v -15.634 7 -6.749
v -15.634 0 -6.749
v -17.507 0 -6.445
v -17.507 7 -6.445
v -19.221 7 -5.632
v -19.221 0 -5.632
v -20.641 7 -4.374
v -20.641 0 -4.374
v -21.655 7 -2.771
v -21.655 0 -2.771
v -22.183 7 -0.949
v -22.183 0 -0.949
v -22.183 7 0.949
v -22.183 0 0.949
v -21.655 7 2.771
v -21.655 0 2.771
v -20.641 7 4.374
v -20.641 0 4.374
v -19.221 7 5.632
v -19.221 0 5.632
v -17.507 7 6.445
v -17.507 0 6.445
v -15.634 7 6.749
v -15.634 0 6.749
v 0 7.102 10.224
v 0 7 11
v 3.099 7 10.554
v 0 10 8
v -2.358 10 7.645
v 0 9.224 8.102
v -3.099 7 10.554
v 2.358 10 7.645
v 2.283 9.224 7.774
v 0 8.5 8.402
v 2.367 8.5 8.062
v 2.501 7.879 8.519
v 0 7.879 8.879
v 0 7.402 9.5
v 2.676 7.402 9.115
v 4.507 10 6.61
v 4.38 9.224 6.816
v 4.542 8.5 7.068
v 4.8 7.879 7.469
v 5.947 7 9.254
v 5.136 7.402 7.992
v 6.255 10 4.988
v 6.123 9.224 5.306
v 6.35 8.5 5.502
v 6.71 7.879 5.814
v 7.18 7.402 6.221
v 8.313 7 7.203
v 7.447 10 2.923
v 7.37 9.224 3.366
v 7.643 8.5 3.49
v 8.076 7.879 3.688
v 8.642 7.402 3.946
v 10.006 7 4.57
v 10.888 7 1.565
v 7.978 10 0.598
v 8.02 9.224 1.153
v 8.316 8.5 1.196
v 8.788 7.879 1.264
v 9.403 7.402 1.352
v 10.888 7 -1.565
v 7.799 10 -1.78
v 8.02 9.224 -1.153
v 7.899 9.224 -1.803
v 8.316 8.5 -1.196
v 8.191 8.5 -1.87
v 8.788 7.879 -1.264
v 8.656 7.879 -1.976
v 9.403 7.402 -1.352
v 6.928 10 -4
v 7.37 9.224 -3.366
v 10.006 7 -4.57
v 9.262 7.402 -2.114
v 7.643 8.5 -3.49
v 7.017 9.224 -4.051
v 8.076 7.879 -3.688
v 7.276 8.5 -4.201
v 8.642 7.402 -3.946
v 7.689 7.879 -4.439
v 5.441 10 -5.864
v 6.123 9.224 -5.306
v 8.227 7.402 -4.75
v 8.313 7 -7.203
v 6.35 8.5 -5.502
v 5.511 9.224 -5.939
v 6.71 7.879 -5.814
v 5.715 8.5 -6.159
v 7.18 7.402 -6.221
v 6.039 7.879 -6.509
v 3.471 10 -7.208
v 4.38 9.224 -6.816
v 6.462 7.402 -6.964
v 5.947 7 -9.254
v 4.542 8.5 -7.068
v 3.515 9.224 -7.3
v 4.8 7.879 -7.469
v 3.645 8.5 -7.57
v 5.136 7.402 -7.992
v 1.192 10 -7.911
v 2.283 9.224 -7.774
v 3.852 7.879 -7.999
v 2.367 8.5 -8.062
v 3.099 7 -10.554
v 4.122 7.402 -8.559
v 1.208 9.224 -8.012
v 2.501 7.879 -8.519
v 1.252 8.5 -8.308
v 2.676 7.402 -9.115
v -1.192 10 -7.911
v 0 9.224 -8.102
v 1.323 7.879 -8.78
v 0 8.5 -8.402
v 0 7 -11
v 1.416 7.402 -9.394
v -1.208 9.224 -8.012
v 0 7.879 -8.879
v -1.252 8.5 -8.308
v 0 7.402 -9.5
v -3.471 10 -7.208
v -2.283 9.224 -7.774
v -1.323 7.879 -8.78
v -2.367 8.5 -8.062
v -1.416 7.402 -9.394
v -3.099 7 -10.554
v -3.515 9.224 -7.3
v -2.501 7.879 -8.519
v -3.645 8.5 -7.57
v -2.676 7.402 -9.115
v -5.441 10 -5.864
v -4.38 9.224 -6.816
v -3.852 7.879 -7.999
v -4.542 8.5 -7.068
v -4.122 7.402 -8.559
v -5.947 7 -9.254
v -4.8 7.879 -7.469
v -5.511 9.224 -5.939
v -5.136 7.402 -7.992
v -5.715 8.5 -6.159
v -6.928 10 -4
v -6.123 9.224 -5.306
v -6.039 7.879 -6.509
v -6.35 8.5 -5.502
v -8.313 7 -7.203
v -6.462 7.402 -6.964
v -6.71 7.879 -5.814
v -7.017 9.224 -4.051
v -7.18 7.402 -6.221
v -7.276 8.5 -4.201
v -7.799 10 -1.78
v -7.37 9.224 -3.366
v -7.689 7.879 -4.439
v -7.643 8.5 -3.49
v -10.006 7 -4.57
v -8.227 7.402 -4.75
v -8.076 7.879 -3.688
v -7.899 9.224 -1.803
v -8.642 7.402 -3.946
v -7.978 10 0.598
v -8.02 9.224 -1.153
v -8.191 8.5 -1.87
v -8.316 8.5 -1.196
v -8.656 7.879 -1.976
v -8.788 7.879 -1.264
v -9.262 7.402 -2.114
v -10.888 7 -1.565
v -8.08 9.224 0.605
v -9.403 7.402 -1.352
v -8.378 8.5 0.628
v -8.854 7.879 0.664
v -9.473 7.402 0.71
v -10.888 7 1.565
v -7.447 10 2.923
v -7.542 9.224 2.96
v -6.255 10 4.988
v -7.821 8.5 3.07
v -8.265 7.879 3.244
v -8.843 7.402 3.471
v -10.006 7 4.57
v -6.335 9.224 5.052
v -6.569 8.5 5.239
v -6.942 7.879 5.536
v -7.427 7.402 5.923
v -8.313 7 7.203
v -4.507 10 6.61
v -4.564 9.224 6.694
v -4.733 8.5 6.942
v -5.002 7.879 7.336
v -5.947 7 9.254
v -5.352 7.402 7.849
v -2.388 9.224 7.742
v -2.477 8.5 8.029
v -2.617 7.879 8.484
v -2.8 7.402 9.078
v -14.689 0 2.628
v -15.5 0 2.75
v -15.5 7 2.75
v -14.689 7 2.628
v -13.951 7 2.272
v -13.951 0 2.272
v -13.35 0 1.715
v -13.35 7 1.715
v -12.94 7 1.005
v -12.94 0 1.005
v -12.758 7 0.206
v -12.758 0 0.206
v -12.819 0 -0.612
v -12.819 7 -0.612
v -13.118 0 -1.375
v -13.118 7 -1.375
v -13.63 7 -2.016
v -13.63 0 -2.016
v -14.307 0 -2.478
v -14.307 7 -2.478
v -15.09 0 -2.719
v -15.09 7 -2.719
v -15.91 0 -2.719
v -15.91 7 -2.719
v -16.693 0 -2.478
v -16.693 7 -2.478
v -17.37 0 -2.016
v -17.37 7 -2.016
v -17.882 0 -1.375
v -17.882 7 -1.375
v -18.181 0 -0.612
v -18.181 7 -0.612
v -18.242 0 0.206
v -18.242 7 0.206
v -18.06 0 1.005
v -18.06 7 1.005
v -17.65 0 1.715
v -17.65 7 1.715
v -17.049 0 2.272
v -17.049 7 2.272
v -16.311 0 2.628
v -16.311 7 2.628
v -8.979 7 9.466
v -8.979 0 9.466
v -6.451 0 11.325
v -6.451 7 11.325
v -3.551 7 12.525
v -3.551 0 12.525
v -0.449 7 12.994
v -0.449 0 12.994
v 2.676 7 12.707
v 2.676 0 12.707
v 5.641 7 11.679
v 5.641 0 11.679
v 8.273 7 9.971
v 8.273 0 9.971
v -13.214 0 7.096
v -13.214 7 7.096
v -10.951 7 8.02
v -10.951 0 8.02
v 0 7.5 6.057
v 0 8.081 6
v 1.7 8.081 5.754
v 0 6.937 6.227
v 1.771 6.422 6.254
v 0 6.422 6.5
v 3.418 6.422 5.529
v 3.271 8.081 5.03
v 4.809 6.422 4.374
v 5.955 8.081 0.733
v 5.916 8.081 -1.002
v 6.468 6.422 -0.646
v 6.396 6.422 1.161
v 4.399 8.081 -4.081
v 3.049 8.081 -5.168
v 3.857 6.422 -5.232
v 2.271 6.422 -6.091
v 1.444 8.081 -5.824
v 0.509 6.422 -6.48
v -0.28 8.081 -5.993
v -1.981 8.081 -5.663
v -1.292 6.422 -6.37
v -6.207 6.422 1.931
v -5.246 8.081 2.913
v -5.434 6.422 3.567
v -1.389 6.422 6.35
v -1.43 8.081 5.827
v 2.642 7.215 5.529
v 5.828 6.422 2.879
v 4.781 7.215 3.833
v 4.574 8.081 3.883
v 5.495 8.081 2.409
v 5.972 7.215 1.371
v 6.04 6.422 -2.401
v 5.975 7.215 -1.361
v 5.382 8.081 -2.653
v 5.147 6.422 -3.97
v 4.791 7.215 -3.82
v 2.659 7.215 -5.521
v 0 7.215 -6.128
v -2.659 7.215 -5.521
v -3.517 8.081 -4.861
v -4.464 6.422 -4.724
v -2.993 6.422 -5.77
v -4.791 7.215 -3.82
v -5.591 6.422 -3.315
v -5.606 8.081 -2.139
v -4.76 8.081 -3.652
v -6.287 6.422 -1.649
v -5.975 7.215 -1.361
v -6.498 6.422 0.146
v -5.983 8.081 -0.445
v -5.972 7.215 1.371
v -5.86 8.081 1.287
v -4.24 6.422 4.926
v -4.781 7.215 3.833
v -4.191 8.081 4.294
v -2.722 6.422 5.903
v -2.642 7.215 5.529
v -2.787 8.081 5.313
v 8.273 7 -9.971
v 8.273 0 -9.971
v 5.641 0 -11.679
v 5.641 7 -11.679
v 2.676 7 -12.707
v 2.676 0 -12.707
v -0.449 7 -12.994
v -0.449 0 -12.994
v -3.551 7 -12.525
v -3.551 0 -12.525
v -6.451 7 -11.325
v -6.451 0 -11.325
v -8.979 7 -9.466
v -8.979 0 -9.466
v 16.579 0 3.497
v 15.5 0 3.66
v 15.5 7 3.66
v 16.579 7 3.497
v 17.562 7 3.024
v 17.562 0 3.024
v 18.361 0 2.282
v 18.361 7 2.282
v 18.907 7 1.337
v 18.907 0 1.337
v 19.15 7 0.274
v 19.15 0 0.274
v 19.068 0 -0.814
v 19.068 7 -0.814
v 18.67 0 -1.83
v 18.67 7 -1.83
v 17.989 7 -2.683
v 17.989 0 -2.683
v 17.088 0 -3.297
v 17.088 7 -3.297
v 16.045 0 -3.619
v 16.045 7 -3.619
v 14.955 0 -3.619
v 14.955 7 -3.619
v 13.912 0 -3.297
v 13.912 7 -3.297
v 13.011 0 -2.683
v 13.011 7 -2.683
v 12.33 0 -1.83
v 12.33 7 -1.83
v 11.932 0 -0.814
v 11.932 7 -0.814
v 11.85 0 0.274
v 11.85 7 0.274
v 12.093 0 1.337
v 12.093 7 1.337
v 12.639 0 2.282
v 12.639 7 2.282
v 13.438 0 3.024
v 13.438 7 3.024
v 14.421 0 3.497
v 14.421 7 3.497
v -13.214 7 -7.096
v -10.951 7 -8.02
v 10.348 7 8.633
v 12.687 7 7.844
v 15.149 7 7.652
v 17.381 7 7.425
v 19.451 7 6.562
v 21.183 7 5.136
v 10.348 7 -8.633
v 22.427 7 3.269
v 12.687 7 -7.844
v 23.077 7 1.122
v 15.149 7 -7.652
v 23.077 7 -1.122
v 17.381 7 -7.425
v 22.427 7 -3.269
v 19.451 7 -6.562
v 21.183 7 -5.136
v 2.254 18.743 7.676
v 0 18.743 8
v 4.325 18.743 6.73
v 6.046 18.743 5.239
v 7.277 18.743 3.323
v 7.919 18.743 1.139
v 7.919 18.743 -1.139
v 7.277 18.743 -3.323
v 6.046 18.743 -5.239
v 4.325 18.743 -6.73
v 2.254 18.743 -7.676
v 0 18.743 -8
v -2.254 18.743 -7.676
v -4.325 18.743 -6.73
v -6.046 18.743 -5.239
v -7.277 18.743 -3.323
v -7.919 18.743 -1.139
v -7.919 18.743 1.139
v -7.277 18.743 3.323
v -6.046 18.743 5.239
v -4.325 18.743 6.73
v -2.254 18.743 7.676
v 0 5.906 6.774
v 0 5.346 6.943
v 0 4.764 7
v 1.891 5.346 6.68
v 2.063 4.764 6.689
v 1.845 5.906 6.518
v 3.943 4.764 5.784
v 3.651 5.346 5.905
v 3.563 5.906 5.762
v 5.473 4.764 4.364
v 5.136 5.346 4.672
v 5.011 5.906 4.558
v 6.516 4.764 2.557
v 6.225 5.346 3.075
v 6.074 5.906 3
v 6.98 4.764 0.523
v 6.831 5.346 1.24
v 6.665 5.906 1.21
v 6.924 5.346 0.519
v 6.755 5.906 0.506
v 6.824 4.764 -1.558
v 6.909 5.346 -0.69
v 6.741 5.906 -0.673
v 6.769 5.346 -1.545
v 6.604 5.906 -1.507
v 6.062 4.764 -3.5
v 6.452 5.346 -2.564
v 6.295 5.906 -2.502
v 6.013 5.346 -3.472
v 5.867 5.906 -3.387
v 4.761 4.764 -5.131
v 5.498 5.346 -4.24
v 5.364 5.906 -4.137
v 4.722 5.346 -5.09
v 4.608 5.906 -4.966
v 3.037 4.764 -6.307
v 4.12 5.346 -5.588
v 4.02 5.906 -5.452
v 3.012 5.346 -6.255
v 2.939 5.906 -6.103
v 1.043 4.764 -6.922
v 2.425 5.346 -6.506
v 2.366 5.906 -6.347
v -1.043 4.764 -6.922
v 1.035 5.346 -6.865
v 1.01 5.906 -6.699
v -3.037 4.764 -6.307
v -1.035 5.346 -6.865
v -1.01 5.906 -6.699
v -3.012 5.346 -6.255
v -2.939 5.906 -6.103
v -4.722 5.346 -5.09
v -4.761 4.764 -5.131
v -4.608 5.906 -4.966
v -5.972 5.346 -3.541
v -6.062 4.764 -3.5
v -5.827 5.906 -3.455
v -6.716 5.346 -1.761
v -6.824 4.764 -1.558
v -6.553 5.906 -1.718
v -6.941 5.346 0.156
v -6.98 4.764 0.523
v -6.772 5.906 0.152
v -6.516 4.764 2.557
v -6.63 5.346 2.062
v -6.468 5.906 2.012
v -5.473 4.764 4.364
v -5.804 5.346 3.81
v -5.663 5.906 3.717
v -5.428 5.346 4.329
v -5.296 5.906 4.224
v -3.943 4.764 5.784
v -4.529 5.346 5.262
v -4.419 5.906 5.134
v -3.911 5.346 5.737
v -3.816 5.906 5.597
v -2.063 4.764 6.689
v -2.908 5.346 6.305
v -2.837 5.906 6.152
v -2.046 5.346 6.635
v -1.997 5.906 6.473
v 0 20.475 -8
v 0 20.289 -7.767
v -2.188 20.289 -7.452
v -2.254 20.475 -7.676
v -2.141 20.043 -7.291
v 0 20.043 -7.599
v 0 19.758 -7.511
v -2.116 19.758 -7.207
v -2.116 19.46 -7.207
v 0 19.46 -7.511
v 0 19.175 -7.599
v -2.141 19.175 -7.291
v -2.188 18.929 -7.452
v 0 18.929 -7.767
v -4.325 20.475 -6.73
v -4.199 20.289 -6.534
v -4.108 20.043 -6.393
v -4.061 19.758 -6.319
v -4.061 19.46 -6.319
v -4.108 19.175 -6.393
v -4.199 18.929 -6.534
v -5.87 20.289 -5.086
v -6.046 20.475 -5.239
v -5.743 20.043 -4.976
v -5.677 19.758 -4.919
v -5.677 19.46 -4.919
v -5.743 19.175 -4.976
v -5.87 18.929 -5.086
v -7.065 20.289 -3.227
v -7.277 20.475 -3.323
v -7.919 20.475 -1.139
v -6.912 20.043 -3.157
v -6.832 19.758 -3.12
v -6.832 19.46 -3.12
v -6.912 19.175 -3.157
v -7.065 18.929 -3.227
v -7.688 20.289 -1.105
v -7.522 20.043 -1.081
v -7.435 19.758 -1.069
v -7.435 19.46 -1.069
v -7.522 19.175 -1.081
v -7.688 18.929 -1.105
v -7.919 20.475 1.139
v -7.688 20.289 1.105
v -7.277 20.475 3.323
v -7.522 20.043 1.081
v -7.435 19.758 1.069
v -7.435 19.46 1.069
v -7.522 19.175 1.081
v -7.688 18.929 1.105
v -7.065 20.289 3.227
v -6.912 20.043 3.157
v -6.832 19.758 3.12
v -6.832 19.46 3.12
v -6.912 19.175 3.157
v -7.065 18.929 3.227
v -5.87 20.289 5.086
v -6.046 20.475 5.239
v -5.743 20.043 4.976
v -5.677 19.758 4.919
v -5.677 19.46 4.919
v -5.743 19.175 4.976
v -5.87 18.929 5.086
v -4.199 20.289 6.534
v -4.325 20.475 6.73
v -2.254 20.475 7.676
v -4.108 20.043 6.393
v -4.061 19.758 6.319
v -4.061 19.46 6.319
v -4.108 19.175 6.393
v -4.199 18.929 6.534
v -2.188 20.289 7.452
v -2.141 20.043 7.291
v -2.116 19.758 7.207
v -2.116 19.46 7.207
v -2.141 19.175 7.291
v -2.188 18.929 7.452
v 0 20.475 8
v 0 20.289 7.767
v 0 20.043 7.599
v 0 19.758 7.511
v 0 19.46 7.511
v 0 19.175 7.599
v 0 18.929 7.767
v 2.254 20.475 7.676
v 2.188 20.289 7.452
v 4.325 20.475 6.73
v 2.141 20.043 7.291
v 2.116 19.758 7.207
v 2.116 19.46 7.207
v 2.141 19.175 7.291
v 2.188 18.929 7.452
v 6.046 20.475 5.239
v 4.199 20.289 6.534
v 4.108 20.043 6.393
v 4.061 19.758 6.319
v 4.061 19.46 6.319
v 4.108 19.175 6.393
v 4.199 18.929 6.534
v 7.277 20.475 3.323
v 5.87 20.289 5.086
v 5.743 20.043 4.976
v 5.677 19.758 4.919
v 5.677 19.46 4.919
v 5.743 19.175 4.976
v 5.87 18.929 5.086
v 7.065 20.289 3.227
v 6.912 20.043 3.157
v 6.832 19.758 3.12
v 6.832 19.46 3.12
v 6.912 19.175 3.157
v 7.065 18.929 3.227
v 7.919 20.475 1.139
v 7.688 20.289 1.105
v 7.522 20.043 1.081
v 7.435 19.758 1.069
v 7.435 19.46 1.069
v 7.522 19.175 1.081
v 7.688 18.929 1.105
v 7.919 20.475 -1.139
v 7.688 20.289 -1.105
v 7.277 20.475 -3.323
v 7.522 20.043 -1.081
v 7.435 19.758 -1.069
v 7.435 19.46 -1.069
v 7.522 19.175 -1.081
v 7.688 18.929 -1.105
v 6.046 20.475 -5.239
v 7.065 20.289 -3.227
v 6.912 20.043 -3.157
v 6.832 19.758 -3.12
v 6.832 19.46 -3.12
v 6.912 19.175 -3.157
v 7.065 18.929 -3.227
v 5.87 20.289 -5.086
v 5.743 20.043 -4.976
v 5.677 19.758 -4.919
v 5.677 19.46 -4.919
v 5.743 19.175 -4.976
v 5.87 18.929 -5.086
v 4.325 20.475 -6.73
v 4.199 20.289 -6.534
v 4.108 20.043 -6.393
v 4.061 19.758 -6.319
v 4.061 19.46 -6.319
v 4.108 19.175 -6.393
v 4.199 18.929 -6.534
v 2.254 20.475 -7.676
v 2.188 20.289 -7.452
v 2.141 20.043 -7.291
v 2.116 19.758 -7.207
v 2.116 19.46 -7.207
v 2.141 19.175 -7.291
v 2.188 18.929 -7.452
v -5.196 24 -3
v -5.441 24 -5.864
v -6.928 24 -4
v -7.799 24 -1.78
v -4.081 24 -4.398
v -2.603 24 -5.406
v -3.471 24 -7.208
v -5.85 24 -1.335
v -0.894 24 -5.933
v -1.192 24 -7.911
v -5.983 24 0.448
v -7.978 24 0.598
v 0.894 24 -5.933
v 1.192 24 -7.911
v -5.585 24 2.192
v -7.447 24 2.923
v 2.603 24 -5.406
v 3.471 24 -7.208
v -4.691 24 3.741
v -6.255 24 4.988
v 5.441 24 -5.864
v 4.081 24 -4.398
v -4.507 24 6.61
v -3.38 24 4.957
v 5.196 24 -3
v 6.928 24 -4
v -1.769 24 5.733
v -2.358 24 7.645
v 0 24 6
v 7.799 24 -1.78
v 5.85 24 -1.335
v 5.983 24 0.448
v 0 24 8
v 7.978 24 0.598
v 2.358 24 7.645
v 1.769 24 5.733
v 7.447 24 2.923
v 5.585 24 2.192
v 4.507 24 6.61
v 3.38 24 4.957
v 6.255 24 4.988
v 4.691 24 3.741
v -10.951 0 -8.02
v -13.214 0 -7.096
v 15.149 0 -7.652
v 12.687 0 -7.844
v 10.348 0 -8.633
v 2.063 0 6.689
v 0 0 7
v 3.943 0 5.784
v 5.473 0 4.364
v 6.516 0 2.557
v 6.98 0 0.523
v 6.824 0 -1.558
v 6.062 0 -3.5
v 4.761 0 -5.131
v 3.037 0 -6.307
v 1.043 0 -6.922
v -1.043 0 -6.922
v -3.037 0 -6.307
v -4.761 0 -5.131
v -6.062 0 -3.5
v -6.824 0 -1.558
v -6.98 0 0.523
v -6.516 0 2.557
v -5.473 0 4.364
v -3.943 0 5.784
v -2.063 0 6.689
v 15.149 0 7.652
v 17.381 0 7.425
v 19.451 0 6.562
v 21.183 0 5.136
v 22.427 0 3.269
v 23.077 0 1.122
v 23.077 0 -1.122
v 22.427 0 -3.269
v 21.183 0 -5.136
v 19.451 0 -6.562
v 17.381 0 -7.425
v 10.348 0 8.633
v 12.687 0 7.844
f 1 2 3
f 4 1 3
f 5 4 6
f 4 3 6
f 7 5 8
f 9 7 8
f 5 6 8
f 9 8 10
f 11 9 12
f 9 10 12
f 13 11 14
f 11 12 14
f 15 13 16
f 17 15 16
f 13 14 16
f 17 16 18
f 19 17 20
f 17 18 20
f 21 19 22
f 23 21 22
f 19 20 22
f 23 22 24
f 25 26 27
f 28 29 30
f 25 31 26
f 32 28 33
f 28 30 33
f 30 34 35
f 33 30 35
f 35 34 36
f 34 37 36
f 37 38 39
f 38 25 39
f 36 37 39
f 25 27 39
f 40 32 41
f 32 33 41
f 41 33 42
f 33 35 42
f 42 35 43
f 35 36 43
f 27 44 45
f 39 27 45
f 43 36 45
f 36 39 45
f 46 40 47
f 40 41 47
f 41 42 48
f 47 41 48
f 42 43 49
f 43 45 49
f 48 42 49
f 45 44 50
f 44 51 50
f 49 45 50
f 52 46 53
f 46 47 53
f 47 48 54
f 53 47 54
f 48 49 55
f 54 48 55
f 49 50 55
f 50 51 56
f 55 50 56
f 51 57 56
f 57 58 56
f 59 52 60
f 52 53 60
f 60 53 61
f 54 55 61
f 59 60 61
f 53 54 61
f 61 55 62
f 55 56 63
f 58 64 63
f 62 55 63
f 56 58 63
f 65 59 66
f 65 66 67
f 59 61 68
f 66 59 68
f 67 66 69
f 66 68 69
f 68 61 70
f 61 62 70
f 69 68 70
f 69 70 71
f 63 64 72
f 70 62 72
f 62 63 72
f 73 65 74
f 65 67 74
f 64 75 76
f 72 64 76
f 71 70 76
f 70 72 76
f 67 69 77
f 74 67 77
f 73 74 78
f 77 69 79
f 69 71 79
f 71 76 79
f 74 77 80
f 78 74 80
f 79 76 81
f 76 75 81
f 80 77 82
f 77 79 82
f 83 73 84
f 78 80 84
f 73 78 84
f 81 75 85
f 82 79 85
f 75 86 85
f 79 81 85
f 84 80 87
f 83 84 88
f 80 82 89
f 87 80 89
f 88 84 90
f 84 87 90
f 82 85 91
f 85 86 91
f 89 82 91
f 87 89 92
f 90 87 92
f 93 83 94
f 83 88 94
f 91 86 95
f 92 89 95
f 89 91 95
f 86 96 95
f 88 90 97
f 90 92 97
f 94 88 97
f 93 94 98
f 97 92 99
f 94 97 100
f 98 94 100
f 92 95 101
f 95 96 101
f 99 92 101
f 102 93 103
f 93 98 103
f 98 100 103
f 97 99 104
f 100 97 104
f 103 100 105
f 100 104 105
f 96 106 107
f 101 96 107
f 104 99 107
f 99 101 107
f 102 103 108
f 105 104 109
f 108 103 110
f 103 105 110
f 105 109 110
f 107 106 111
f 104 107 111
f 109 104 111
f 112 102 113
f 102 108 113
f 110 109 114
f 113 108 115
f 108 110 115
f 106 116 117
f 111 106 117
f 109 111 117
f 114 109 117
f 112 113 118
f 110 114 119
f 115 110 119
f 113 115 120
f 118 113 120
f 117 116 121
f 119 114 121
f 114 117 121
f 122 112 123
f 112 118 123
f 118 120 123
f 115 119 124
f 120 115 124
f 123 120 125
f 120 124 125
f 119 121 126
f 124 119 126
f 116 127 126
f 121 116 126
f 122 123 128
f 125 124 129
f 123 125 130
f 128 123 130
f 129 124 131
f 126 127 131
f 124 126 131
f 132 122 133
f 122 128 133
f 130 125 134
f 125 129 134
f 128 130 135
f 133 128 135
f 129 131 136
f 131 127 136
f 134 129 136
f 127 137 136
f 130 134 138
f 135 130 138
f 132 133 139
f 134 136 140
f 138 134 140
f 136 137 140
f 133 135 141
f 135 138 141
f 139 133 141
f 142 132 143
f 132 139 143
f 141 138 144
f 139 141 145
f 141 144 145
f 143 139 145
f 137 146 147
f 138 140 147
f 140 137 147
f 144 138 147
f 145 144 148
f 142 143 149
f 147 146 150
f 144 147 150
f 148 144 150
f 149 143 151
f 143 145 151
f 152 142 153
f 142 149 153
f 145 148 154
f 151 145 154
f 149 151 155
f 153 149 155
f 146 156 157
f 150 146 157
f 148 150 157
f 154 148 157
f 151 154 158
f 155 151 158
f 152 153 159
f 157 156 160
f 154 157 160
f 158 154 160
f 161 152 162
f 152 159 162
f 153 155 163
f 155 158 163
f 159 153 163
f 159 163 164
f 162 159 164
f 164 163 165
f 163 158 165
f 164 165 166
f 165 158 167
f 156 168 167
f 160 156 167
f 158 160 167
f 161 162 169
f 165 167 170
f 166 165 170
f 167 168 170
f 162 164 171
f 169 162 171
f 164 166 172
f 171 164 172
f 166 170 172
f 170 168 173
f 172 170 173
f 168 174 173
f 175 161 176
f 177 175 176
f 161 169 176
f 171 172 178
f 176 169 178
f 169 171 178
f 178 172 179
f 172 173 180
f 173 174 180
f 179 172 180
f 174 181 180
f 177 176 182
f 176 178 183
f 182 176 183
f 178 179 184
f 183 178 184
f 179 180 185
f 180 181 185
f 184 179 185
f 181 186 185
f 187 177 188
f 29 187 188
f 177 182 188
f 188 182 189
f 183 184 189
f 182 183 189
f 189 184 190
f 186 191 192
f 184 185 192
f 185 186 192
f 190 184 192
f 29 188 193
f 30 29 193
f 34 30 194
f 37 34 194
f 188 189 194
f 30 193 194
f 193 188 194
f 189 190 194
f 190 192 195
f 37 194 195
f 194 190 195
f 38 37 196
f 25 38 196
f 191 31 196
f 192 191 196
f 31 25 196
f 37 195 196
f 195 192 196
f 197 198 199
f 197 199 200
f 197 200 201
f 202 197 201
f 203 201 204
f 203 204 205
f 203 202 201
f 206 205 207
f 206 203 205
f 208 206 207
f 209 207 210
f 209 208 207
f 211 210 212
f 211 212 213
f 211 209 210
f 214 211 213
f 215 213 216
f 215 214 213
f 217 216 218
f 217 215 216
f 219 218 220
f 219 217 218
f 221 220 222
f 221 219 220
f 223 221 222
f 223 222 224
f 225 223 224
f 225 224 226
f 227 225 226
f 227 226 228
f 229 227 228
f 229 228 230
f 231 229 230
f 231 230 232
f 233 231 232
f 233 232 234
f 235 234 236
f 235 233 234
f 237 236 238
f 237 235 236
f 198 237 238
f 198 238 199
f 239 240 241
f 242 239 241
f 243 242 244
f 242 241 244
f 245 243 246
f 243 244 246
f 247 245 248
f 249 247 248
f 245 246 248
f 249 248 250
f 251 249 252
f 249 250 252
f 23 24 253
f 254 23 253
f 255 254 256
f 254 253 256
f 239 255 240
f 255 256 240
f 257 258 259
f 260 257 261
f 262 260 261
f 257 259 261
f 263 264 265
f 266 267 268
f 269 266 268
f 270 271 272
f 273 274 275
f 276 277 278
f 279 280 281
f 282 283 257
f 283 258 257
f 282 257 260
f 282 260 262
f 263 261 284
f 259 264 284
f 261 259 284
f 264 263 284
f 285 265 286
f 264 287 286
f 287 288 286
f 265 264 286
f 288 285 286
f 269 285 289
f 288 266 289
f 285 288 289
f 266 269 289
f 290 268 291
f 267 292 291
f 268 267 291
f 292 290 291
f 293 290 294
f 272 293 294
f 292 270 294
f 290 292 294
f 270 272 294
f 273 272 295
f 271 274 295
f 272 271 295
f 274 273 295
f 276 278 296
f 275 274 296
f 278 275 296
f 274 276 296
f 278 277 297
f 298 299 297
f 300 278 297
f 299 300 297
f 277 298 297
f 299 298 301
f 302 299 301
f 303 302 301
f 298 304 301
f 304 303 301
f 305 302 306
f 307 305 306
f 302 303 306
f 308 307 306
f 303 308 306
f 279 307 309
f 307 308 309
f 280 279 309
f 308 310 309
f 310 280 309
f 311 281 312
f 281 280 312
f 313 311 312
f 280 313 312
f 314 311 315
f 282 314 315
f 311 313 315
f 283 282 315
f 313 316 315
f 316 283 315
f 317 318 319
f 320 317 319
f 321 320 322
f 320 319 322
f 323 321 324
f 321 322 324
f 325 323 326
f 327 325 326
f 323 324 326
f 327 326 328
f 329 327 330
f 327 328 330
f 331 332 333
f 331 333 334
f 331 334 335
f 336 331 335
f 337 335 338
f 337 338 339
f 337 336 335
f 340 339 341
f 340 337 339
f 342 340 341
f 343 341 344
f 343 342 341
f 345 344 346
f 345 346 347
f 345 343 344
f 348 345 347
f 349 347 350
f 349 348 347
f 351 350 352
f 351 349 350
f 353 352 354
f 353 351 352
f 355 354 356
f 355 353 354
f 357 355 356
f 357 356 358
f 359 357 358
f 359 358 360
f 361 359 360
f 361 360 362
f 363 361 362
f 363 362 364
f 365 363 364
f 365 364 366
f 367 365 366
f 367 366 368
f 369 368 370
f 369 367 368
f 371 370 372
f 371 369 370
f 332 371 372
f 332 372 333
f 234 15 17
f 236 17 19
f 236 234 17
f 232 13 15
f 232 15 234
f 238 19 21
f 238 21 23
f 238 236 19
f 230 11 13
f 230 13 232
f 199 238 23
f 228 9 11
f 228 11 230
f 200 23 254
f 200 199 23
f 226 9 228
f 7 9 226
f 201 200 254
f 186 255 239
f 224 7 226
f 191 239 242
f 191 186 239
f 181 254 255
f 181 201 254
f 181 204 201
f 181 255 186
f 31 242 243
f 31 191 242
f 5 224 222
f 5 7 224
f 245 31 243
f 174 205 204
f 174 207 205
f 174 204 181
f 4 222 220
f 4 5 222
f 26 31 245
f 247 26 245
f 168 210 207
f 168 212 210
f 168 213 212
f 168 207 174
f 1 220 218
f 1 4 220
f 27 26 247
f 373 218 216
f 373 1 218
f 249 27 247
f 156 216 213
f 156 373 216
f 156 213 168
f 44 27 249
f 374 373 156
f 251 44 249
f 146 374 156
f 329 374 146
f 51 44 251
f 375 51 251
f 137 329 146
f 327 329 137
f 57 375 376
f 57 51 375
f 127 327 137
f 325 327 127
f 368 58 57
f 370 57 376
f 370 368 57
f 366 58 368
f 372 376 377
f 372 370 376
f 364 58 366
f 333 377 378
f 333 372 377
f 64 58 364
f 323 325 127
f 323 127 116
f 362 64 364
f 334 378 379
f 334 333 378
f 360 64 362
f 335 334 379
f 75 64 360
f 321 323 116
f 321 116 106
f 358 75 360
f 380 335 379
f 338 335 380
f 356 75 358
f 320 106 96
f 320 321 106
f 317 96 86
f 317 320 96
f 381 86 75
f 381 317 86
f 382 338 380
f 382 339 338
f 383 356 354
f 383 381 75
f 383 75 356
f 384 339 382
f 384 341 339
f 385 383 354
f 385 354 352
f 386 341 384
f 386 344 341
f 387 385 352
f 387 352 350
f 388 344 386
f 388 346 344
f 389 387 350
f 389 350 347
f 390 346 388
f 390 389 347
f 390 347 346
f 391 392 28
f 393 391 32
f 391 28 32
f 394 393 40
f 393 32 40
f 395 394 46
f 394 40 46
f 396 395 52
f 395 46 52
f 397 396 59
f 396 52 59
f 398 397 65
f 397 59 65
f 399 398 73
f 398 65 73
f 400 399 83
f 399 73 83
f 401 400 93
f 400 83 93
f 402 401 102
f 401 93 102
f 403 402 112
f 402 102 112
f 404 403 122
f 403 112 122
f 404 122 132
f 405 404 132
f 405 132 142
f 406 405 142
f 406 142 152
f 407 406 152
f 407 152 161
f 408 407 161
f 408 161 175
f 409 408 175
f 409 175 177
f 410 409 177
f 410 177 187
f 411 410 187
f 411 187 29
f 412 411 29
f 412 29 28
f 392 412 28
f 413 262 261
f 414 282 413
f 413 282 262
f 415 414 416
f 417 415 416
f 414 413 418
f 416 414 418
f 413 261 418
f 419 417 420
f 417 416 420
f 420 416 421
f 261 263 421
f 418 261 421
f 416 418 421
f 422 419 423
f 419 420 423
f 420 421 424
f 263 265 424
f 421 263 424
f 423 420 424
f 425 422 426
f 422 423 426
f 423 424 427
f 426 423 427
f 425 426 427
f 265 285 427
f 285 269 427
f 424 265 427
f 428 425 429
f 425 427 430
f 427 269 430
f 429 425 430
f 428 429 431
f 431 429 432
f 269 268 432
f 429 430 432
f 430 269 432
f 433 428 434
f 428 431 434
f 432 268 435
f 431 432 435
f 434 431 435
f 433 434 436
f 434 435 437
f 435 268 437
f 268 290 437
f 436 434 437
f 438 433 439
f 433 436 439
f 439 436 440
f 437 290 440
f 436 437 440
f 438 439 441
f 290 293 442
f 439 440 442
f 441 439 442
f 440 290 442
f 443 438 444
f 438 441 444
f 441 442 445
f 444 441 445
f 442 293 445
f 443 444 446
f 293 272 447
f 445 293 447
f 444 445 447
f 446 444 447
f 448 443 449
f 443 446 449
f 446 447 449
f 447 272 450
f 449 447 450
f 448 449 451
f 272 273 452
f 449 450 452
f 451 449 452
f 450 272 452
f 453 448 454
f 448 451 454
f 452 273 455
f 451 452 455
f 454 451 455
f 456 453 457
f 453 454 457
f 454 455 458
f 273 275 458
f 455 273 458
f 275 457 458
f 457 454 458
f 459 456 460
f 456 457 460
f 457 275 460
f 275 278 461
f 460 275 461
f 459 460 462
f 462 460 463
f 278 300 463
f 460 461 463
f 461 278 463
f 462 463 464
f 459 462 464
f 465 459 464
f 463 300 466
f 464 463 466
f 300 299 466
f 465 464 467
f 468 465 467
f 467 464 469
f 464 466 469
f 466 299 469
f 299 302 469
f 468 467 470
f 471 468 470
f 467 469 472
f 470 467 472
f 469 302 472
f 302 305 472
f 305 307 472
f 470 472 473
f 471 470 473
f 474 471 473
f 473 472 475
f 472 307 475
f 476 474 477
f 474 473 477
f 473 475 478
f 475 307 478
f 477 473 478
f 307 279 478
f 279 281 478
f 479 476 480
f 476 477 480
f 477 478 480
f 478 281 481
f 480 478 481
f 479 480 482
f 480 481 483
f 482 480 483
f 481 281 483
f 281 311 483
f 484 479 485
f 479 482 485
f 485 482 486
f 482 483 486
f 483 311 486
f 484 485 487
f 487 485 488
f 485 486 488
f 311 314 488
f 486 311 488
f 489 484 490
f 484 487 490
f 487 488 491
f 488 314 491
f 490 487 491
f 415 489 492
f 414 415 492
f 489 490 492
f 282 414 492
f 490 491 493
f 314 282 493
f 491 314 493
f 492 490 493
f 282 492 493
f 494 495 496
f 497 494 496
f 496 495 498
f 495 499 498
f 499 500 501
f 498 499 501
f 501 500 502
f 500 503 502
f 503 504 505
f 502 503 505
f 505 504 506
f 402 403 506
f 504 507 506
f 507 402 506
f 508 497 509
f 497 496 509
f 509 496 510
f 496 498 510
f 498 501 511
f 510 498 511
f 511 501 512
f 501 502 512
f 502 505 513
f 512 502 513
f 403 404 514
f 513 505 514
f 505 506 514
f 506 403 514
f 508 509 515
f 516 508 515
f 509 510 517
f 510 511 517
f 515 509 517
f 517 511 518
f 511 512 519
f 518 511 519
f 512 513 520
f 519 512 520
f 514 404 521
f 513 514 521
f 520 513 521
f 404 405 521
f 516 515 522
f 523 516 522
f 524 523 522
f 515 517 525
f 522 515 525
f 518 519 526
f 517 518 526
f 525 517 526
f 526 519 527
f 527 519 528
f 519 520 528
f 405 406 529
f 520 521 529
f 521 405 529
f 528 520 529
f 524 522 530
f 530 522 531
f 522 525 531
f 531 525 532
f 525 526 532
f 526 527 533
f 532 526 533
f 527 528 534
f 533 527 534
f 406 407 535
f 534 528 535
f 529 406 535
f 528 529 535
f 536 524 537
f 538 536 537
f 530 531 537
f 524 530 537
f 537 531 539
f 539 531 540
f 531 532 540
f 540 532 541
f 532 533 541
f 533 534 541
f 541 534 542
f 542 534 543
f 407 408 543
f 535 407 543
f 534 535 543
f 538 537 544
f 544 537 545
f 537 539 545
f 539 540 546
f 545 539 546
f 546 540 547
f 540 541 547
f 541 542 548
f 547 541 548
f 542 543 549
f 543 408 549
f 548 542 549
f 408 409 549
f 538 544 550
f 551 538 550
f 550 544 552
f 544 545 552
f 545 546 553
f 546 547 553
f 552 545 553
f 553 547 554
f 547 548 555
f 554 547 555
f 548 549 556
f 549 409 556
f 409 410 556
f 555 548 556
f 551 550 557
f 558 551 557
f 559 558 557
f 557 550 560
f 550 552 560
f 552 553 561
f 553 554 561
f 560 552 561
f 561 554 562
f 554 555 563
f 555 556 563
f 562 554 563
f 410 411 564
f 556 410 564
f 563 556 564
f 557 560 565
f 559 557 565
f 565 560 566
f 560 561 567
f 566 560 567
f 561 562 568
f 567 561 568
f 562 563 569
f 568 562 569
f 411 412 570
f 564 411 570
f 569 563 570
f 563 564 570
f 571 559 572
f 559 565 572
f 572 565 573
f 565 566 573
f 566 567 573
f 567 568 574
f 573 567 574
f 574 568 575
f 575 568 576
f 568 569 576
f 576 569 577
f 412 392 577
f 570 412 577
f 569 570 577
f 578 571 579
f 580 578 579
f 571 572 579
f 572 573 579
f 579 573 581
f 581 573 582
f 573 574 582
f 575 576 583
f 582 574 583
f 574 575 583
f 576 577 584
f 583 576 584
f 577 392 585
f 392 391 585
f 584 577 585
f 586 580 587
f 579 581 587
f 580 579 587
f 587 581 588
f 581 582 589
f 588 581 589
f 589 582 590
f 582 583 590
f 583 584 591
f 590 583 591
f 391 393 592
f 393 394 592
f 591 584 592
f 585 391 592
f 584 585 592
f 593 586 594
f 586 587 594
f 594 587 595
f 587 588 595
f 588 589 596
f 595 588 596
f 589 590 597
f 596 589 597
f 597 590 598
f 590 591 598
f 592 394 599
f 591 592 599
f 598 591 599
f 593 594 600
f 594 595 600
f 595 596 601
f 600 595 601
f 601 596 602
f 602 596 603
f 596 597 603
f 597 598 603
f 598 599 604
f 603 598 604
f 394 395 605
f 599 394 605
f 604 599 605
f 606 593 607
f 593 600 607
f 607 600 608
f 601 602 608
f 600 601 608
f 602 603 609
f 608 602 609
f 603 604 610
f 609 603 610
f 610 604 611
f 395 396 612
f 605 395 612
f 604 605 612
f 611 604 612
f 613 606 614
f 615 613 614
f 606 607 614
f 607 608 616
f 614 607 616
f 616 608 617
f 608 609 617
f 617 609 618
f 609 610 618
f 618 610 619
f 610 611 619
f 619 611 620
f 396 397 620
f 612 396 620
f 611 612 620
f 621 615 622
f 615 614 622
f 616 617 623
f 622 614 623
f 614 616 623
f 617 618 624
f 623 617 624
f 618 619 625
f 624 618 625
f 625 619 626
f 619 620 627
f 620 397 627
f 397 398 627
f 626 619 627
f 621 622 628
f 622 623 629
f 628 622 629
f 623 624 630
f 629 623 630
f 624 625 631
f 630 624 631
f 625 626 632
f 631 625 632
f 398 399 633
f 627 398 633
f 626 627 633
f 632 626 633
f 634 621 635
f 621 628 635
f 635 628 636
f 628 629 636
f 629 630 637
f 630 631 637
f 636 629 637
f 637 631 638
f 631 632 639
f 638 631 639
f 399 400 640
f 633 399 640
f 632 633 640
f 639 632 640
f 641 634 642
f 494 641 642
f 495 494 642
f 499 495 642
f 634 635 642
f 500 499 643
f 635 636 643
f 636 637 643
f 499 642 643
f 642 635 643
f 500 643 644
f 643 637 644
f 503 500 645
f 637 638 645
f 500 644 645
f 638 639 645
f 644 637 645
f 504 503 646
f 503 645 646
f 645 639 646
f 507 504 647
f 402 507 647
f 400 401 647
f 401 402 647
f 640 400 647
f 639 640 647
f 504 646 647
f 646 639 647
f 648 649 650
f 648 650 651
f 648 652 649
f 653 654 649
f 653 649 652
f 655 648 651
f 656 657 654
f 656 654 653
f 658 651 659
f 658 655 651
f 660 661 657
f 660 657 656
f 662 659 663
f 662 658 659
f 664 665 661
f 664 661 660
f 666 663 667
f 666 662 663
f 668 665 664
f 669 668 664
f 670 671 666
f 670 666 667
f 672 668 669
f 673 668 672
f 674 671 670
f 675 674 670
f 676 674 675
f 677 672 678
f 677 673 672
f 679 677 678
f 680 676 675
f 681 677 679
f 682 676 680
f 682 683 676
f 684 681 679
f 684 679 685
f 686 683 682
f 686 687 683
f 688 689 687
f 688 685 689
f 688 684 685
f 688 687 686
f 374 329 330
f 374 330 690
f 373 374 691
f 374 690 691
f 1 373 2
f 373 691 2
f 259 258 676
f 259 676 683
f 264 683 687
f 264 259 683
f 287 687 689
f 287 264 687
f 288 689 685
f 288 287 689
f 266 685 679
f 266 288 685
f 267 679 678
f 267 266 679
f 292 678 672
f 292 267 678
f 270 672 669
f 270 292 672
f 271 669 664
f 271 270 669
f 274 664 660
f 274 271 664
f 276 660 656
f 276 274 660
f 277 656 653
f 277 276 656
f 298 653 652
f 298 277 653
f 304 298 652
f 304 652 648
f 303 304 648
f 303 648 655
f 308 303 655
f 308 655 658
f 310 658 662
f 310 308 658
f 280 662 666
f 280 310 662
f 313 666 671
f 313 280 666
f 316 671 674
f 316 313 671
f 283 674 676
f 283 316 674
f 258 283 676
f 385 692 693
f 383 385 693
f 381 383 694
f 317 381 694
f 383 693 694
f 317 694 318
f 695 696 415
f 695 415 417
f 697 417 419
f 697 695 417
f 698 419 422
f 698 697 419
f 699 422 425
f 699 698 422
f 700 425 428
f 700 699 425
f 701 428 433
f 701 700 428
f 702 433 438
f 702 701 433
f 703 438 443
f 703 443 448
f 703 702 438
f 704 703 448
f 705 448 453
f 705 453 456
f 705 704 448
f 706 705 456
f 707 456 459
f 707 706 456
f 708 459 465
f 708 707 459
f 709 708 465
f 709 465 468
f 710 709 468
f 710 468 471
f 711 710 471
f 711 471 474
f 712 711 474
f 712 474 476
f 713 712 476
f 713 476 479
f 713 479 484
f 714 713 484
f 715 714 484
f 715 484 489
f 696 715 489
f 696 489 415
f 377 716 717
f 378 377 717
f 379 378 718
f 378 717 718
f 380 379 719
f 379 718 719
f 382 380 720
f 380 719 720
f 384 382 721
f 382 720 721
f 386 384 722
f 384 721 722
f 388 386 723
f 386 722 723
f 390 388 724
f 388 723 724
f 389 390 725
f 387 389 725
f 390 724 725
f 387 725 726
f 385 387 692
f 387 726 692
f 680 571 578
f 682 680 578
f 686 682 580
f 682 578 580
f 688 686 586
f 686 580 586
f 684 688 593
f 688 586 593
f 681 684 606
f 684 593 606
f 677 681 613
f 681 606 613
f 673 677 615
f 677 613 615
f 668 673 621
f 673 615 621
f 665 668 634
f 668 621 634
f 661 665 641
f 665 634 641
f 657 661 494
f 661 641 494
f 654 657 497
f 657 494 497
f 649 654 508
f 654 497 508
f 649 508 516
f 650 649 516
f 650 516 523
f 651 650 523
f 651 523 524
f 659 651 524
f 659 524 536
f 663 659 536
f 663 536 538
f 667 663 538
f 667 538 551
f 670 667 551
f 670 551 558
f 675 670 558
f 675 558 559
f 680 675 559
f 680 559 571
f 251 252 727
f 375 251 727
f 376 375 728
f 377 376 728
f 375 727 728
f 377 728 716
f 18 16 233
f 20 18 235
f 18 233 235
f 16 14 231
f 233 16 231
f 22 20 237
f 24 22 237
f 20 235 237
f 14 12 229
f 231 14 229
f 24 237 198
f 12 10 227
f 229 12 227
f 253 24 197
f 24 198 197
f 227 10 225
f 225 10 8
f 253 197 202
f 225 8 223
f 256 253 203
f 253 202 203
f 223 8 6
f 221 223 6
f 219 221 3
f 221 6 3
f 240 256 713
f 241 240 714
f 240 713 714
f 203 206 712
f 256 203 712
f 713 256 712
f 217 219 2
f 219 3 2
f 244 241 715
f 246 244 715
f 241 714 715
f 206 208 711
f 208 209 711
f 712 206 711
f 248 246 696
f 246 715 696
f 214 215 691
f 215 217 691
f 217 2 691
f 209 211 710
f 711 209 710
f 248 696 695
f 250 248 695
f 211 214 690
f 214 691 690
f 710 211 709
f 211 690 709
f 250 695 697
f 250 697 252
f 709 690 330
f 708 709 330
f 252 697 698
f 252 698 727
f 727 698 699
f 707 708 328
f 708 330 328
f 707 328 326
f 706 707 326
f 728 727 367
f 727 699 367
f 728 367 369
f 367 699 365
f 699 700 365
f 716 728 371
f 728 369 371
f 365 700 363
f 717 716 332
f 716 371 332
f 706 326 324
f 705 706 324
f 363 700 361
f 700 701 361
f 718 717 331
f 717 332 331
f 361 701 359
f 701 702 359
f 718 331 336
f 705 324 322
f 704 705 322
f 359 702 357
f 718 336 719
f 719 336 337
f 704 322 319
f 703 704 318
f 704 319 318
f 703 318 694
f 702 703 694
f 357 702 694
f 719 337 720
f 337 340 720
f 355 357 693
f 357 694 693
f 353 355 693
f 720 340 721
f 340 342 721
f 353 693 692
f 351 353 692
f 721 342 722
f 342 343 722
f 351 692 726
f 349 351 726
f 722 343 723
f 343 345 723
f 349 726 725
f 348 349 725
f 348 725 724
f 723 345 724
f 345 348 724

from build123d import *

# Parameters (mm, degrees)
SKETCH1_R           = 7
SKETCH1_R_2         = 2.75
SKETCH1_R_3         = 3.659852489
BOSS_EXTRUDE1_DEPTH = 7
SKETCH2_R           = 8
SKETCH2_R_2         = 6
BOSS_EXTRUDE2_DEPTH = 17
FILLET1_R           = 3
FILLET2_R           = 3
SKETCH3_R           = 1


with BuildPart() as part:
    # Sketch1 → Boss-Extrude1 (new body)
    with BuildSketch(Plane(origin=(0, 0, 0), x_dir=(1, 0, 0), z_dir=(0, 1, 0))):
        with BuildLine():
            ThreePointArc((-15.634333704, 6.748663161), (-22.25, 0), (-15.634333704, -6.748663161))
            ThreePointArc((-15.634333704, -6.748663161), (-12.054001616, -7.488359295), (-8.978814065, -9.465516285))
            ThreePointArc((-8.978814065, -9.465516285), (-0.448762307, -12.99442036), (8.273320847, -9.971141939))
            ThreePointArc((8.273320847, -9.971141939), (11.493139678, -8.165901558), (15.148520579, -7.651784261))
            ThreePointArc((15.148520579, -7.651784261), (23.159852489, 0), (15.148520579, 7.651784261))
            ThreePointArc((15.148520579, 7.651784261), (11.493139678, 8.165901558), (8.273320847, 9.971141939))
            ThreePointArc((8.273320847, 9.971141939), (-0.448762307, 12.99442036), (-8.978814065, 9.465516285))
            ThreePointArc((-8.978814065, 9.465516285), (-12.054001616, 7.488359295), (-15.634333704, 6.748663161))
        make_face()
        with Locations(Location((0, 0, 0), (0, 0, 270))):
            Circle(SKETCH1_R, mode=Mode.SUBTRACT)
        with Locations(Location((-15.5, 0, 0), (0, 0, 270))):
            Circle(SKETCH1_R_2, mode=Mode.SUBTRACT)
        with Locations(Location((15.5, 0, 0), (0, 0, 270))):
            Circle(SKETCH1_R_3, mode=Mode.SUBTRACT)
    extrude(amount=BOSS_EXTRUDE1_DEPTH)

    # Sketch2 → Boss-Extrude2 (add)
    with BuildSketch(Plane(origin=(0, 7, 0), x_dir=(1, 0, 0), z_dir=(0, 1, 0))):
        with Locations(Location((0, 0, 0), (0, 0, 270))):
            Circle(SKETCH2_R)
        with Locations(Location((0, 0, 0), (0, 0, 270))):
            Circle(SKETCH2_R_2, mode=Mode.SUBTRACT)
    extrude(amount=BOSS_EXTRUDE2_DEPTH)

    # Fillet1
    # the kernel refuses this fillet: 3 mm, written as the material it adds along each edge
    with BuildSketch(Plane(origin=(0, 7, 0), x_dir=(0, 0, 1), z_dir=(-1, 0, 0))) as fillet1_piece_1:
        with BuildLine():
            CenterArc((4, -2.236067977), FILLET1_R, 0, 48.189685104)
            Line((6, 0), (6.04, 0.04472136))
            ThreePointArc((6.04, 0.04472136), (6.5, 0.06), (7, 0.06))
            Line((7, 0.06), (7.06, 0))
            Line((7.06, 0), (7.06, -2.236067977))
            Line((7.06, -2.236067977), (7, -2.236067977))
        make_face()
    revolve(axis=Axis((0, 7, 0), (0, 1, 0)))
    with BuildSketch(Plane(origin=(0, 7, 0), x_dir=(0, 0, 1), z_dir=(-1, 0, 0))) as fillet1_piece_2:
        with BuildLine():
            CenterArc((8 + FILLET1_R, FILLET1_R), FILLET1_R, 180, 90)
            Line((8, FILLET1_R), (8 - FILLET1_R * 0.02, FILLET1_R))
            Line((8 - FILLET1_R * 0.02, FILLET1_R), (8 - FILLET1_R * 0.02, -FILLET1_R * 0.02))
            Line((8 - FILLET1_R * 0.02, -FILLET1_R * 0.02), (8 + FILLET1_R, -FILLET1_R * 0.02))
            Line((8 + FILLET1_R, -FILLET1_R * 0.02), (8 + FILLET1_R, 0))
        make_face()
    revolve(axis=Axis((0, 7, 0), (0, 1, 0)))

    # Fillet2
    fillet2_edges = [part.edges().sort_by_distance(p)[0] for p in [
        (0, 7, -6),
    ]]
    fillet(fillet2_edges, radius=FILLET2_R)


with BuildPart() as body_2:
    # Sketch3 → Revolve1 (revolve)
    with BuildSketch(Plane(origin=(0, 0, 0), x_dir=(0, 0, -1), z_dir=(1, 0, 0))):
        with Locations((8.5, 19.608844607)):
            Circle(SKETCH3_R)
    revolve(axis=Axis((0, 0, 0), (0, 1, 0)))


with BuildPart() as part_1:
    add(part.part)

    # Intersect1: read off the stored shape, not the designer's step
    # Intersect1: cut body 2
    add(body_2.part, mode=Mode.SUBTRACT)


solid = part_1.part
